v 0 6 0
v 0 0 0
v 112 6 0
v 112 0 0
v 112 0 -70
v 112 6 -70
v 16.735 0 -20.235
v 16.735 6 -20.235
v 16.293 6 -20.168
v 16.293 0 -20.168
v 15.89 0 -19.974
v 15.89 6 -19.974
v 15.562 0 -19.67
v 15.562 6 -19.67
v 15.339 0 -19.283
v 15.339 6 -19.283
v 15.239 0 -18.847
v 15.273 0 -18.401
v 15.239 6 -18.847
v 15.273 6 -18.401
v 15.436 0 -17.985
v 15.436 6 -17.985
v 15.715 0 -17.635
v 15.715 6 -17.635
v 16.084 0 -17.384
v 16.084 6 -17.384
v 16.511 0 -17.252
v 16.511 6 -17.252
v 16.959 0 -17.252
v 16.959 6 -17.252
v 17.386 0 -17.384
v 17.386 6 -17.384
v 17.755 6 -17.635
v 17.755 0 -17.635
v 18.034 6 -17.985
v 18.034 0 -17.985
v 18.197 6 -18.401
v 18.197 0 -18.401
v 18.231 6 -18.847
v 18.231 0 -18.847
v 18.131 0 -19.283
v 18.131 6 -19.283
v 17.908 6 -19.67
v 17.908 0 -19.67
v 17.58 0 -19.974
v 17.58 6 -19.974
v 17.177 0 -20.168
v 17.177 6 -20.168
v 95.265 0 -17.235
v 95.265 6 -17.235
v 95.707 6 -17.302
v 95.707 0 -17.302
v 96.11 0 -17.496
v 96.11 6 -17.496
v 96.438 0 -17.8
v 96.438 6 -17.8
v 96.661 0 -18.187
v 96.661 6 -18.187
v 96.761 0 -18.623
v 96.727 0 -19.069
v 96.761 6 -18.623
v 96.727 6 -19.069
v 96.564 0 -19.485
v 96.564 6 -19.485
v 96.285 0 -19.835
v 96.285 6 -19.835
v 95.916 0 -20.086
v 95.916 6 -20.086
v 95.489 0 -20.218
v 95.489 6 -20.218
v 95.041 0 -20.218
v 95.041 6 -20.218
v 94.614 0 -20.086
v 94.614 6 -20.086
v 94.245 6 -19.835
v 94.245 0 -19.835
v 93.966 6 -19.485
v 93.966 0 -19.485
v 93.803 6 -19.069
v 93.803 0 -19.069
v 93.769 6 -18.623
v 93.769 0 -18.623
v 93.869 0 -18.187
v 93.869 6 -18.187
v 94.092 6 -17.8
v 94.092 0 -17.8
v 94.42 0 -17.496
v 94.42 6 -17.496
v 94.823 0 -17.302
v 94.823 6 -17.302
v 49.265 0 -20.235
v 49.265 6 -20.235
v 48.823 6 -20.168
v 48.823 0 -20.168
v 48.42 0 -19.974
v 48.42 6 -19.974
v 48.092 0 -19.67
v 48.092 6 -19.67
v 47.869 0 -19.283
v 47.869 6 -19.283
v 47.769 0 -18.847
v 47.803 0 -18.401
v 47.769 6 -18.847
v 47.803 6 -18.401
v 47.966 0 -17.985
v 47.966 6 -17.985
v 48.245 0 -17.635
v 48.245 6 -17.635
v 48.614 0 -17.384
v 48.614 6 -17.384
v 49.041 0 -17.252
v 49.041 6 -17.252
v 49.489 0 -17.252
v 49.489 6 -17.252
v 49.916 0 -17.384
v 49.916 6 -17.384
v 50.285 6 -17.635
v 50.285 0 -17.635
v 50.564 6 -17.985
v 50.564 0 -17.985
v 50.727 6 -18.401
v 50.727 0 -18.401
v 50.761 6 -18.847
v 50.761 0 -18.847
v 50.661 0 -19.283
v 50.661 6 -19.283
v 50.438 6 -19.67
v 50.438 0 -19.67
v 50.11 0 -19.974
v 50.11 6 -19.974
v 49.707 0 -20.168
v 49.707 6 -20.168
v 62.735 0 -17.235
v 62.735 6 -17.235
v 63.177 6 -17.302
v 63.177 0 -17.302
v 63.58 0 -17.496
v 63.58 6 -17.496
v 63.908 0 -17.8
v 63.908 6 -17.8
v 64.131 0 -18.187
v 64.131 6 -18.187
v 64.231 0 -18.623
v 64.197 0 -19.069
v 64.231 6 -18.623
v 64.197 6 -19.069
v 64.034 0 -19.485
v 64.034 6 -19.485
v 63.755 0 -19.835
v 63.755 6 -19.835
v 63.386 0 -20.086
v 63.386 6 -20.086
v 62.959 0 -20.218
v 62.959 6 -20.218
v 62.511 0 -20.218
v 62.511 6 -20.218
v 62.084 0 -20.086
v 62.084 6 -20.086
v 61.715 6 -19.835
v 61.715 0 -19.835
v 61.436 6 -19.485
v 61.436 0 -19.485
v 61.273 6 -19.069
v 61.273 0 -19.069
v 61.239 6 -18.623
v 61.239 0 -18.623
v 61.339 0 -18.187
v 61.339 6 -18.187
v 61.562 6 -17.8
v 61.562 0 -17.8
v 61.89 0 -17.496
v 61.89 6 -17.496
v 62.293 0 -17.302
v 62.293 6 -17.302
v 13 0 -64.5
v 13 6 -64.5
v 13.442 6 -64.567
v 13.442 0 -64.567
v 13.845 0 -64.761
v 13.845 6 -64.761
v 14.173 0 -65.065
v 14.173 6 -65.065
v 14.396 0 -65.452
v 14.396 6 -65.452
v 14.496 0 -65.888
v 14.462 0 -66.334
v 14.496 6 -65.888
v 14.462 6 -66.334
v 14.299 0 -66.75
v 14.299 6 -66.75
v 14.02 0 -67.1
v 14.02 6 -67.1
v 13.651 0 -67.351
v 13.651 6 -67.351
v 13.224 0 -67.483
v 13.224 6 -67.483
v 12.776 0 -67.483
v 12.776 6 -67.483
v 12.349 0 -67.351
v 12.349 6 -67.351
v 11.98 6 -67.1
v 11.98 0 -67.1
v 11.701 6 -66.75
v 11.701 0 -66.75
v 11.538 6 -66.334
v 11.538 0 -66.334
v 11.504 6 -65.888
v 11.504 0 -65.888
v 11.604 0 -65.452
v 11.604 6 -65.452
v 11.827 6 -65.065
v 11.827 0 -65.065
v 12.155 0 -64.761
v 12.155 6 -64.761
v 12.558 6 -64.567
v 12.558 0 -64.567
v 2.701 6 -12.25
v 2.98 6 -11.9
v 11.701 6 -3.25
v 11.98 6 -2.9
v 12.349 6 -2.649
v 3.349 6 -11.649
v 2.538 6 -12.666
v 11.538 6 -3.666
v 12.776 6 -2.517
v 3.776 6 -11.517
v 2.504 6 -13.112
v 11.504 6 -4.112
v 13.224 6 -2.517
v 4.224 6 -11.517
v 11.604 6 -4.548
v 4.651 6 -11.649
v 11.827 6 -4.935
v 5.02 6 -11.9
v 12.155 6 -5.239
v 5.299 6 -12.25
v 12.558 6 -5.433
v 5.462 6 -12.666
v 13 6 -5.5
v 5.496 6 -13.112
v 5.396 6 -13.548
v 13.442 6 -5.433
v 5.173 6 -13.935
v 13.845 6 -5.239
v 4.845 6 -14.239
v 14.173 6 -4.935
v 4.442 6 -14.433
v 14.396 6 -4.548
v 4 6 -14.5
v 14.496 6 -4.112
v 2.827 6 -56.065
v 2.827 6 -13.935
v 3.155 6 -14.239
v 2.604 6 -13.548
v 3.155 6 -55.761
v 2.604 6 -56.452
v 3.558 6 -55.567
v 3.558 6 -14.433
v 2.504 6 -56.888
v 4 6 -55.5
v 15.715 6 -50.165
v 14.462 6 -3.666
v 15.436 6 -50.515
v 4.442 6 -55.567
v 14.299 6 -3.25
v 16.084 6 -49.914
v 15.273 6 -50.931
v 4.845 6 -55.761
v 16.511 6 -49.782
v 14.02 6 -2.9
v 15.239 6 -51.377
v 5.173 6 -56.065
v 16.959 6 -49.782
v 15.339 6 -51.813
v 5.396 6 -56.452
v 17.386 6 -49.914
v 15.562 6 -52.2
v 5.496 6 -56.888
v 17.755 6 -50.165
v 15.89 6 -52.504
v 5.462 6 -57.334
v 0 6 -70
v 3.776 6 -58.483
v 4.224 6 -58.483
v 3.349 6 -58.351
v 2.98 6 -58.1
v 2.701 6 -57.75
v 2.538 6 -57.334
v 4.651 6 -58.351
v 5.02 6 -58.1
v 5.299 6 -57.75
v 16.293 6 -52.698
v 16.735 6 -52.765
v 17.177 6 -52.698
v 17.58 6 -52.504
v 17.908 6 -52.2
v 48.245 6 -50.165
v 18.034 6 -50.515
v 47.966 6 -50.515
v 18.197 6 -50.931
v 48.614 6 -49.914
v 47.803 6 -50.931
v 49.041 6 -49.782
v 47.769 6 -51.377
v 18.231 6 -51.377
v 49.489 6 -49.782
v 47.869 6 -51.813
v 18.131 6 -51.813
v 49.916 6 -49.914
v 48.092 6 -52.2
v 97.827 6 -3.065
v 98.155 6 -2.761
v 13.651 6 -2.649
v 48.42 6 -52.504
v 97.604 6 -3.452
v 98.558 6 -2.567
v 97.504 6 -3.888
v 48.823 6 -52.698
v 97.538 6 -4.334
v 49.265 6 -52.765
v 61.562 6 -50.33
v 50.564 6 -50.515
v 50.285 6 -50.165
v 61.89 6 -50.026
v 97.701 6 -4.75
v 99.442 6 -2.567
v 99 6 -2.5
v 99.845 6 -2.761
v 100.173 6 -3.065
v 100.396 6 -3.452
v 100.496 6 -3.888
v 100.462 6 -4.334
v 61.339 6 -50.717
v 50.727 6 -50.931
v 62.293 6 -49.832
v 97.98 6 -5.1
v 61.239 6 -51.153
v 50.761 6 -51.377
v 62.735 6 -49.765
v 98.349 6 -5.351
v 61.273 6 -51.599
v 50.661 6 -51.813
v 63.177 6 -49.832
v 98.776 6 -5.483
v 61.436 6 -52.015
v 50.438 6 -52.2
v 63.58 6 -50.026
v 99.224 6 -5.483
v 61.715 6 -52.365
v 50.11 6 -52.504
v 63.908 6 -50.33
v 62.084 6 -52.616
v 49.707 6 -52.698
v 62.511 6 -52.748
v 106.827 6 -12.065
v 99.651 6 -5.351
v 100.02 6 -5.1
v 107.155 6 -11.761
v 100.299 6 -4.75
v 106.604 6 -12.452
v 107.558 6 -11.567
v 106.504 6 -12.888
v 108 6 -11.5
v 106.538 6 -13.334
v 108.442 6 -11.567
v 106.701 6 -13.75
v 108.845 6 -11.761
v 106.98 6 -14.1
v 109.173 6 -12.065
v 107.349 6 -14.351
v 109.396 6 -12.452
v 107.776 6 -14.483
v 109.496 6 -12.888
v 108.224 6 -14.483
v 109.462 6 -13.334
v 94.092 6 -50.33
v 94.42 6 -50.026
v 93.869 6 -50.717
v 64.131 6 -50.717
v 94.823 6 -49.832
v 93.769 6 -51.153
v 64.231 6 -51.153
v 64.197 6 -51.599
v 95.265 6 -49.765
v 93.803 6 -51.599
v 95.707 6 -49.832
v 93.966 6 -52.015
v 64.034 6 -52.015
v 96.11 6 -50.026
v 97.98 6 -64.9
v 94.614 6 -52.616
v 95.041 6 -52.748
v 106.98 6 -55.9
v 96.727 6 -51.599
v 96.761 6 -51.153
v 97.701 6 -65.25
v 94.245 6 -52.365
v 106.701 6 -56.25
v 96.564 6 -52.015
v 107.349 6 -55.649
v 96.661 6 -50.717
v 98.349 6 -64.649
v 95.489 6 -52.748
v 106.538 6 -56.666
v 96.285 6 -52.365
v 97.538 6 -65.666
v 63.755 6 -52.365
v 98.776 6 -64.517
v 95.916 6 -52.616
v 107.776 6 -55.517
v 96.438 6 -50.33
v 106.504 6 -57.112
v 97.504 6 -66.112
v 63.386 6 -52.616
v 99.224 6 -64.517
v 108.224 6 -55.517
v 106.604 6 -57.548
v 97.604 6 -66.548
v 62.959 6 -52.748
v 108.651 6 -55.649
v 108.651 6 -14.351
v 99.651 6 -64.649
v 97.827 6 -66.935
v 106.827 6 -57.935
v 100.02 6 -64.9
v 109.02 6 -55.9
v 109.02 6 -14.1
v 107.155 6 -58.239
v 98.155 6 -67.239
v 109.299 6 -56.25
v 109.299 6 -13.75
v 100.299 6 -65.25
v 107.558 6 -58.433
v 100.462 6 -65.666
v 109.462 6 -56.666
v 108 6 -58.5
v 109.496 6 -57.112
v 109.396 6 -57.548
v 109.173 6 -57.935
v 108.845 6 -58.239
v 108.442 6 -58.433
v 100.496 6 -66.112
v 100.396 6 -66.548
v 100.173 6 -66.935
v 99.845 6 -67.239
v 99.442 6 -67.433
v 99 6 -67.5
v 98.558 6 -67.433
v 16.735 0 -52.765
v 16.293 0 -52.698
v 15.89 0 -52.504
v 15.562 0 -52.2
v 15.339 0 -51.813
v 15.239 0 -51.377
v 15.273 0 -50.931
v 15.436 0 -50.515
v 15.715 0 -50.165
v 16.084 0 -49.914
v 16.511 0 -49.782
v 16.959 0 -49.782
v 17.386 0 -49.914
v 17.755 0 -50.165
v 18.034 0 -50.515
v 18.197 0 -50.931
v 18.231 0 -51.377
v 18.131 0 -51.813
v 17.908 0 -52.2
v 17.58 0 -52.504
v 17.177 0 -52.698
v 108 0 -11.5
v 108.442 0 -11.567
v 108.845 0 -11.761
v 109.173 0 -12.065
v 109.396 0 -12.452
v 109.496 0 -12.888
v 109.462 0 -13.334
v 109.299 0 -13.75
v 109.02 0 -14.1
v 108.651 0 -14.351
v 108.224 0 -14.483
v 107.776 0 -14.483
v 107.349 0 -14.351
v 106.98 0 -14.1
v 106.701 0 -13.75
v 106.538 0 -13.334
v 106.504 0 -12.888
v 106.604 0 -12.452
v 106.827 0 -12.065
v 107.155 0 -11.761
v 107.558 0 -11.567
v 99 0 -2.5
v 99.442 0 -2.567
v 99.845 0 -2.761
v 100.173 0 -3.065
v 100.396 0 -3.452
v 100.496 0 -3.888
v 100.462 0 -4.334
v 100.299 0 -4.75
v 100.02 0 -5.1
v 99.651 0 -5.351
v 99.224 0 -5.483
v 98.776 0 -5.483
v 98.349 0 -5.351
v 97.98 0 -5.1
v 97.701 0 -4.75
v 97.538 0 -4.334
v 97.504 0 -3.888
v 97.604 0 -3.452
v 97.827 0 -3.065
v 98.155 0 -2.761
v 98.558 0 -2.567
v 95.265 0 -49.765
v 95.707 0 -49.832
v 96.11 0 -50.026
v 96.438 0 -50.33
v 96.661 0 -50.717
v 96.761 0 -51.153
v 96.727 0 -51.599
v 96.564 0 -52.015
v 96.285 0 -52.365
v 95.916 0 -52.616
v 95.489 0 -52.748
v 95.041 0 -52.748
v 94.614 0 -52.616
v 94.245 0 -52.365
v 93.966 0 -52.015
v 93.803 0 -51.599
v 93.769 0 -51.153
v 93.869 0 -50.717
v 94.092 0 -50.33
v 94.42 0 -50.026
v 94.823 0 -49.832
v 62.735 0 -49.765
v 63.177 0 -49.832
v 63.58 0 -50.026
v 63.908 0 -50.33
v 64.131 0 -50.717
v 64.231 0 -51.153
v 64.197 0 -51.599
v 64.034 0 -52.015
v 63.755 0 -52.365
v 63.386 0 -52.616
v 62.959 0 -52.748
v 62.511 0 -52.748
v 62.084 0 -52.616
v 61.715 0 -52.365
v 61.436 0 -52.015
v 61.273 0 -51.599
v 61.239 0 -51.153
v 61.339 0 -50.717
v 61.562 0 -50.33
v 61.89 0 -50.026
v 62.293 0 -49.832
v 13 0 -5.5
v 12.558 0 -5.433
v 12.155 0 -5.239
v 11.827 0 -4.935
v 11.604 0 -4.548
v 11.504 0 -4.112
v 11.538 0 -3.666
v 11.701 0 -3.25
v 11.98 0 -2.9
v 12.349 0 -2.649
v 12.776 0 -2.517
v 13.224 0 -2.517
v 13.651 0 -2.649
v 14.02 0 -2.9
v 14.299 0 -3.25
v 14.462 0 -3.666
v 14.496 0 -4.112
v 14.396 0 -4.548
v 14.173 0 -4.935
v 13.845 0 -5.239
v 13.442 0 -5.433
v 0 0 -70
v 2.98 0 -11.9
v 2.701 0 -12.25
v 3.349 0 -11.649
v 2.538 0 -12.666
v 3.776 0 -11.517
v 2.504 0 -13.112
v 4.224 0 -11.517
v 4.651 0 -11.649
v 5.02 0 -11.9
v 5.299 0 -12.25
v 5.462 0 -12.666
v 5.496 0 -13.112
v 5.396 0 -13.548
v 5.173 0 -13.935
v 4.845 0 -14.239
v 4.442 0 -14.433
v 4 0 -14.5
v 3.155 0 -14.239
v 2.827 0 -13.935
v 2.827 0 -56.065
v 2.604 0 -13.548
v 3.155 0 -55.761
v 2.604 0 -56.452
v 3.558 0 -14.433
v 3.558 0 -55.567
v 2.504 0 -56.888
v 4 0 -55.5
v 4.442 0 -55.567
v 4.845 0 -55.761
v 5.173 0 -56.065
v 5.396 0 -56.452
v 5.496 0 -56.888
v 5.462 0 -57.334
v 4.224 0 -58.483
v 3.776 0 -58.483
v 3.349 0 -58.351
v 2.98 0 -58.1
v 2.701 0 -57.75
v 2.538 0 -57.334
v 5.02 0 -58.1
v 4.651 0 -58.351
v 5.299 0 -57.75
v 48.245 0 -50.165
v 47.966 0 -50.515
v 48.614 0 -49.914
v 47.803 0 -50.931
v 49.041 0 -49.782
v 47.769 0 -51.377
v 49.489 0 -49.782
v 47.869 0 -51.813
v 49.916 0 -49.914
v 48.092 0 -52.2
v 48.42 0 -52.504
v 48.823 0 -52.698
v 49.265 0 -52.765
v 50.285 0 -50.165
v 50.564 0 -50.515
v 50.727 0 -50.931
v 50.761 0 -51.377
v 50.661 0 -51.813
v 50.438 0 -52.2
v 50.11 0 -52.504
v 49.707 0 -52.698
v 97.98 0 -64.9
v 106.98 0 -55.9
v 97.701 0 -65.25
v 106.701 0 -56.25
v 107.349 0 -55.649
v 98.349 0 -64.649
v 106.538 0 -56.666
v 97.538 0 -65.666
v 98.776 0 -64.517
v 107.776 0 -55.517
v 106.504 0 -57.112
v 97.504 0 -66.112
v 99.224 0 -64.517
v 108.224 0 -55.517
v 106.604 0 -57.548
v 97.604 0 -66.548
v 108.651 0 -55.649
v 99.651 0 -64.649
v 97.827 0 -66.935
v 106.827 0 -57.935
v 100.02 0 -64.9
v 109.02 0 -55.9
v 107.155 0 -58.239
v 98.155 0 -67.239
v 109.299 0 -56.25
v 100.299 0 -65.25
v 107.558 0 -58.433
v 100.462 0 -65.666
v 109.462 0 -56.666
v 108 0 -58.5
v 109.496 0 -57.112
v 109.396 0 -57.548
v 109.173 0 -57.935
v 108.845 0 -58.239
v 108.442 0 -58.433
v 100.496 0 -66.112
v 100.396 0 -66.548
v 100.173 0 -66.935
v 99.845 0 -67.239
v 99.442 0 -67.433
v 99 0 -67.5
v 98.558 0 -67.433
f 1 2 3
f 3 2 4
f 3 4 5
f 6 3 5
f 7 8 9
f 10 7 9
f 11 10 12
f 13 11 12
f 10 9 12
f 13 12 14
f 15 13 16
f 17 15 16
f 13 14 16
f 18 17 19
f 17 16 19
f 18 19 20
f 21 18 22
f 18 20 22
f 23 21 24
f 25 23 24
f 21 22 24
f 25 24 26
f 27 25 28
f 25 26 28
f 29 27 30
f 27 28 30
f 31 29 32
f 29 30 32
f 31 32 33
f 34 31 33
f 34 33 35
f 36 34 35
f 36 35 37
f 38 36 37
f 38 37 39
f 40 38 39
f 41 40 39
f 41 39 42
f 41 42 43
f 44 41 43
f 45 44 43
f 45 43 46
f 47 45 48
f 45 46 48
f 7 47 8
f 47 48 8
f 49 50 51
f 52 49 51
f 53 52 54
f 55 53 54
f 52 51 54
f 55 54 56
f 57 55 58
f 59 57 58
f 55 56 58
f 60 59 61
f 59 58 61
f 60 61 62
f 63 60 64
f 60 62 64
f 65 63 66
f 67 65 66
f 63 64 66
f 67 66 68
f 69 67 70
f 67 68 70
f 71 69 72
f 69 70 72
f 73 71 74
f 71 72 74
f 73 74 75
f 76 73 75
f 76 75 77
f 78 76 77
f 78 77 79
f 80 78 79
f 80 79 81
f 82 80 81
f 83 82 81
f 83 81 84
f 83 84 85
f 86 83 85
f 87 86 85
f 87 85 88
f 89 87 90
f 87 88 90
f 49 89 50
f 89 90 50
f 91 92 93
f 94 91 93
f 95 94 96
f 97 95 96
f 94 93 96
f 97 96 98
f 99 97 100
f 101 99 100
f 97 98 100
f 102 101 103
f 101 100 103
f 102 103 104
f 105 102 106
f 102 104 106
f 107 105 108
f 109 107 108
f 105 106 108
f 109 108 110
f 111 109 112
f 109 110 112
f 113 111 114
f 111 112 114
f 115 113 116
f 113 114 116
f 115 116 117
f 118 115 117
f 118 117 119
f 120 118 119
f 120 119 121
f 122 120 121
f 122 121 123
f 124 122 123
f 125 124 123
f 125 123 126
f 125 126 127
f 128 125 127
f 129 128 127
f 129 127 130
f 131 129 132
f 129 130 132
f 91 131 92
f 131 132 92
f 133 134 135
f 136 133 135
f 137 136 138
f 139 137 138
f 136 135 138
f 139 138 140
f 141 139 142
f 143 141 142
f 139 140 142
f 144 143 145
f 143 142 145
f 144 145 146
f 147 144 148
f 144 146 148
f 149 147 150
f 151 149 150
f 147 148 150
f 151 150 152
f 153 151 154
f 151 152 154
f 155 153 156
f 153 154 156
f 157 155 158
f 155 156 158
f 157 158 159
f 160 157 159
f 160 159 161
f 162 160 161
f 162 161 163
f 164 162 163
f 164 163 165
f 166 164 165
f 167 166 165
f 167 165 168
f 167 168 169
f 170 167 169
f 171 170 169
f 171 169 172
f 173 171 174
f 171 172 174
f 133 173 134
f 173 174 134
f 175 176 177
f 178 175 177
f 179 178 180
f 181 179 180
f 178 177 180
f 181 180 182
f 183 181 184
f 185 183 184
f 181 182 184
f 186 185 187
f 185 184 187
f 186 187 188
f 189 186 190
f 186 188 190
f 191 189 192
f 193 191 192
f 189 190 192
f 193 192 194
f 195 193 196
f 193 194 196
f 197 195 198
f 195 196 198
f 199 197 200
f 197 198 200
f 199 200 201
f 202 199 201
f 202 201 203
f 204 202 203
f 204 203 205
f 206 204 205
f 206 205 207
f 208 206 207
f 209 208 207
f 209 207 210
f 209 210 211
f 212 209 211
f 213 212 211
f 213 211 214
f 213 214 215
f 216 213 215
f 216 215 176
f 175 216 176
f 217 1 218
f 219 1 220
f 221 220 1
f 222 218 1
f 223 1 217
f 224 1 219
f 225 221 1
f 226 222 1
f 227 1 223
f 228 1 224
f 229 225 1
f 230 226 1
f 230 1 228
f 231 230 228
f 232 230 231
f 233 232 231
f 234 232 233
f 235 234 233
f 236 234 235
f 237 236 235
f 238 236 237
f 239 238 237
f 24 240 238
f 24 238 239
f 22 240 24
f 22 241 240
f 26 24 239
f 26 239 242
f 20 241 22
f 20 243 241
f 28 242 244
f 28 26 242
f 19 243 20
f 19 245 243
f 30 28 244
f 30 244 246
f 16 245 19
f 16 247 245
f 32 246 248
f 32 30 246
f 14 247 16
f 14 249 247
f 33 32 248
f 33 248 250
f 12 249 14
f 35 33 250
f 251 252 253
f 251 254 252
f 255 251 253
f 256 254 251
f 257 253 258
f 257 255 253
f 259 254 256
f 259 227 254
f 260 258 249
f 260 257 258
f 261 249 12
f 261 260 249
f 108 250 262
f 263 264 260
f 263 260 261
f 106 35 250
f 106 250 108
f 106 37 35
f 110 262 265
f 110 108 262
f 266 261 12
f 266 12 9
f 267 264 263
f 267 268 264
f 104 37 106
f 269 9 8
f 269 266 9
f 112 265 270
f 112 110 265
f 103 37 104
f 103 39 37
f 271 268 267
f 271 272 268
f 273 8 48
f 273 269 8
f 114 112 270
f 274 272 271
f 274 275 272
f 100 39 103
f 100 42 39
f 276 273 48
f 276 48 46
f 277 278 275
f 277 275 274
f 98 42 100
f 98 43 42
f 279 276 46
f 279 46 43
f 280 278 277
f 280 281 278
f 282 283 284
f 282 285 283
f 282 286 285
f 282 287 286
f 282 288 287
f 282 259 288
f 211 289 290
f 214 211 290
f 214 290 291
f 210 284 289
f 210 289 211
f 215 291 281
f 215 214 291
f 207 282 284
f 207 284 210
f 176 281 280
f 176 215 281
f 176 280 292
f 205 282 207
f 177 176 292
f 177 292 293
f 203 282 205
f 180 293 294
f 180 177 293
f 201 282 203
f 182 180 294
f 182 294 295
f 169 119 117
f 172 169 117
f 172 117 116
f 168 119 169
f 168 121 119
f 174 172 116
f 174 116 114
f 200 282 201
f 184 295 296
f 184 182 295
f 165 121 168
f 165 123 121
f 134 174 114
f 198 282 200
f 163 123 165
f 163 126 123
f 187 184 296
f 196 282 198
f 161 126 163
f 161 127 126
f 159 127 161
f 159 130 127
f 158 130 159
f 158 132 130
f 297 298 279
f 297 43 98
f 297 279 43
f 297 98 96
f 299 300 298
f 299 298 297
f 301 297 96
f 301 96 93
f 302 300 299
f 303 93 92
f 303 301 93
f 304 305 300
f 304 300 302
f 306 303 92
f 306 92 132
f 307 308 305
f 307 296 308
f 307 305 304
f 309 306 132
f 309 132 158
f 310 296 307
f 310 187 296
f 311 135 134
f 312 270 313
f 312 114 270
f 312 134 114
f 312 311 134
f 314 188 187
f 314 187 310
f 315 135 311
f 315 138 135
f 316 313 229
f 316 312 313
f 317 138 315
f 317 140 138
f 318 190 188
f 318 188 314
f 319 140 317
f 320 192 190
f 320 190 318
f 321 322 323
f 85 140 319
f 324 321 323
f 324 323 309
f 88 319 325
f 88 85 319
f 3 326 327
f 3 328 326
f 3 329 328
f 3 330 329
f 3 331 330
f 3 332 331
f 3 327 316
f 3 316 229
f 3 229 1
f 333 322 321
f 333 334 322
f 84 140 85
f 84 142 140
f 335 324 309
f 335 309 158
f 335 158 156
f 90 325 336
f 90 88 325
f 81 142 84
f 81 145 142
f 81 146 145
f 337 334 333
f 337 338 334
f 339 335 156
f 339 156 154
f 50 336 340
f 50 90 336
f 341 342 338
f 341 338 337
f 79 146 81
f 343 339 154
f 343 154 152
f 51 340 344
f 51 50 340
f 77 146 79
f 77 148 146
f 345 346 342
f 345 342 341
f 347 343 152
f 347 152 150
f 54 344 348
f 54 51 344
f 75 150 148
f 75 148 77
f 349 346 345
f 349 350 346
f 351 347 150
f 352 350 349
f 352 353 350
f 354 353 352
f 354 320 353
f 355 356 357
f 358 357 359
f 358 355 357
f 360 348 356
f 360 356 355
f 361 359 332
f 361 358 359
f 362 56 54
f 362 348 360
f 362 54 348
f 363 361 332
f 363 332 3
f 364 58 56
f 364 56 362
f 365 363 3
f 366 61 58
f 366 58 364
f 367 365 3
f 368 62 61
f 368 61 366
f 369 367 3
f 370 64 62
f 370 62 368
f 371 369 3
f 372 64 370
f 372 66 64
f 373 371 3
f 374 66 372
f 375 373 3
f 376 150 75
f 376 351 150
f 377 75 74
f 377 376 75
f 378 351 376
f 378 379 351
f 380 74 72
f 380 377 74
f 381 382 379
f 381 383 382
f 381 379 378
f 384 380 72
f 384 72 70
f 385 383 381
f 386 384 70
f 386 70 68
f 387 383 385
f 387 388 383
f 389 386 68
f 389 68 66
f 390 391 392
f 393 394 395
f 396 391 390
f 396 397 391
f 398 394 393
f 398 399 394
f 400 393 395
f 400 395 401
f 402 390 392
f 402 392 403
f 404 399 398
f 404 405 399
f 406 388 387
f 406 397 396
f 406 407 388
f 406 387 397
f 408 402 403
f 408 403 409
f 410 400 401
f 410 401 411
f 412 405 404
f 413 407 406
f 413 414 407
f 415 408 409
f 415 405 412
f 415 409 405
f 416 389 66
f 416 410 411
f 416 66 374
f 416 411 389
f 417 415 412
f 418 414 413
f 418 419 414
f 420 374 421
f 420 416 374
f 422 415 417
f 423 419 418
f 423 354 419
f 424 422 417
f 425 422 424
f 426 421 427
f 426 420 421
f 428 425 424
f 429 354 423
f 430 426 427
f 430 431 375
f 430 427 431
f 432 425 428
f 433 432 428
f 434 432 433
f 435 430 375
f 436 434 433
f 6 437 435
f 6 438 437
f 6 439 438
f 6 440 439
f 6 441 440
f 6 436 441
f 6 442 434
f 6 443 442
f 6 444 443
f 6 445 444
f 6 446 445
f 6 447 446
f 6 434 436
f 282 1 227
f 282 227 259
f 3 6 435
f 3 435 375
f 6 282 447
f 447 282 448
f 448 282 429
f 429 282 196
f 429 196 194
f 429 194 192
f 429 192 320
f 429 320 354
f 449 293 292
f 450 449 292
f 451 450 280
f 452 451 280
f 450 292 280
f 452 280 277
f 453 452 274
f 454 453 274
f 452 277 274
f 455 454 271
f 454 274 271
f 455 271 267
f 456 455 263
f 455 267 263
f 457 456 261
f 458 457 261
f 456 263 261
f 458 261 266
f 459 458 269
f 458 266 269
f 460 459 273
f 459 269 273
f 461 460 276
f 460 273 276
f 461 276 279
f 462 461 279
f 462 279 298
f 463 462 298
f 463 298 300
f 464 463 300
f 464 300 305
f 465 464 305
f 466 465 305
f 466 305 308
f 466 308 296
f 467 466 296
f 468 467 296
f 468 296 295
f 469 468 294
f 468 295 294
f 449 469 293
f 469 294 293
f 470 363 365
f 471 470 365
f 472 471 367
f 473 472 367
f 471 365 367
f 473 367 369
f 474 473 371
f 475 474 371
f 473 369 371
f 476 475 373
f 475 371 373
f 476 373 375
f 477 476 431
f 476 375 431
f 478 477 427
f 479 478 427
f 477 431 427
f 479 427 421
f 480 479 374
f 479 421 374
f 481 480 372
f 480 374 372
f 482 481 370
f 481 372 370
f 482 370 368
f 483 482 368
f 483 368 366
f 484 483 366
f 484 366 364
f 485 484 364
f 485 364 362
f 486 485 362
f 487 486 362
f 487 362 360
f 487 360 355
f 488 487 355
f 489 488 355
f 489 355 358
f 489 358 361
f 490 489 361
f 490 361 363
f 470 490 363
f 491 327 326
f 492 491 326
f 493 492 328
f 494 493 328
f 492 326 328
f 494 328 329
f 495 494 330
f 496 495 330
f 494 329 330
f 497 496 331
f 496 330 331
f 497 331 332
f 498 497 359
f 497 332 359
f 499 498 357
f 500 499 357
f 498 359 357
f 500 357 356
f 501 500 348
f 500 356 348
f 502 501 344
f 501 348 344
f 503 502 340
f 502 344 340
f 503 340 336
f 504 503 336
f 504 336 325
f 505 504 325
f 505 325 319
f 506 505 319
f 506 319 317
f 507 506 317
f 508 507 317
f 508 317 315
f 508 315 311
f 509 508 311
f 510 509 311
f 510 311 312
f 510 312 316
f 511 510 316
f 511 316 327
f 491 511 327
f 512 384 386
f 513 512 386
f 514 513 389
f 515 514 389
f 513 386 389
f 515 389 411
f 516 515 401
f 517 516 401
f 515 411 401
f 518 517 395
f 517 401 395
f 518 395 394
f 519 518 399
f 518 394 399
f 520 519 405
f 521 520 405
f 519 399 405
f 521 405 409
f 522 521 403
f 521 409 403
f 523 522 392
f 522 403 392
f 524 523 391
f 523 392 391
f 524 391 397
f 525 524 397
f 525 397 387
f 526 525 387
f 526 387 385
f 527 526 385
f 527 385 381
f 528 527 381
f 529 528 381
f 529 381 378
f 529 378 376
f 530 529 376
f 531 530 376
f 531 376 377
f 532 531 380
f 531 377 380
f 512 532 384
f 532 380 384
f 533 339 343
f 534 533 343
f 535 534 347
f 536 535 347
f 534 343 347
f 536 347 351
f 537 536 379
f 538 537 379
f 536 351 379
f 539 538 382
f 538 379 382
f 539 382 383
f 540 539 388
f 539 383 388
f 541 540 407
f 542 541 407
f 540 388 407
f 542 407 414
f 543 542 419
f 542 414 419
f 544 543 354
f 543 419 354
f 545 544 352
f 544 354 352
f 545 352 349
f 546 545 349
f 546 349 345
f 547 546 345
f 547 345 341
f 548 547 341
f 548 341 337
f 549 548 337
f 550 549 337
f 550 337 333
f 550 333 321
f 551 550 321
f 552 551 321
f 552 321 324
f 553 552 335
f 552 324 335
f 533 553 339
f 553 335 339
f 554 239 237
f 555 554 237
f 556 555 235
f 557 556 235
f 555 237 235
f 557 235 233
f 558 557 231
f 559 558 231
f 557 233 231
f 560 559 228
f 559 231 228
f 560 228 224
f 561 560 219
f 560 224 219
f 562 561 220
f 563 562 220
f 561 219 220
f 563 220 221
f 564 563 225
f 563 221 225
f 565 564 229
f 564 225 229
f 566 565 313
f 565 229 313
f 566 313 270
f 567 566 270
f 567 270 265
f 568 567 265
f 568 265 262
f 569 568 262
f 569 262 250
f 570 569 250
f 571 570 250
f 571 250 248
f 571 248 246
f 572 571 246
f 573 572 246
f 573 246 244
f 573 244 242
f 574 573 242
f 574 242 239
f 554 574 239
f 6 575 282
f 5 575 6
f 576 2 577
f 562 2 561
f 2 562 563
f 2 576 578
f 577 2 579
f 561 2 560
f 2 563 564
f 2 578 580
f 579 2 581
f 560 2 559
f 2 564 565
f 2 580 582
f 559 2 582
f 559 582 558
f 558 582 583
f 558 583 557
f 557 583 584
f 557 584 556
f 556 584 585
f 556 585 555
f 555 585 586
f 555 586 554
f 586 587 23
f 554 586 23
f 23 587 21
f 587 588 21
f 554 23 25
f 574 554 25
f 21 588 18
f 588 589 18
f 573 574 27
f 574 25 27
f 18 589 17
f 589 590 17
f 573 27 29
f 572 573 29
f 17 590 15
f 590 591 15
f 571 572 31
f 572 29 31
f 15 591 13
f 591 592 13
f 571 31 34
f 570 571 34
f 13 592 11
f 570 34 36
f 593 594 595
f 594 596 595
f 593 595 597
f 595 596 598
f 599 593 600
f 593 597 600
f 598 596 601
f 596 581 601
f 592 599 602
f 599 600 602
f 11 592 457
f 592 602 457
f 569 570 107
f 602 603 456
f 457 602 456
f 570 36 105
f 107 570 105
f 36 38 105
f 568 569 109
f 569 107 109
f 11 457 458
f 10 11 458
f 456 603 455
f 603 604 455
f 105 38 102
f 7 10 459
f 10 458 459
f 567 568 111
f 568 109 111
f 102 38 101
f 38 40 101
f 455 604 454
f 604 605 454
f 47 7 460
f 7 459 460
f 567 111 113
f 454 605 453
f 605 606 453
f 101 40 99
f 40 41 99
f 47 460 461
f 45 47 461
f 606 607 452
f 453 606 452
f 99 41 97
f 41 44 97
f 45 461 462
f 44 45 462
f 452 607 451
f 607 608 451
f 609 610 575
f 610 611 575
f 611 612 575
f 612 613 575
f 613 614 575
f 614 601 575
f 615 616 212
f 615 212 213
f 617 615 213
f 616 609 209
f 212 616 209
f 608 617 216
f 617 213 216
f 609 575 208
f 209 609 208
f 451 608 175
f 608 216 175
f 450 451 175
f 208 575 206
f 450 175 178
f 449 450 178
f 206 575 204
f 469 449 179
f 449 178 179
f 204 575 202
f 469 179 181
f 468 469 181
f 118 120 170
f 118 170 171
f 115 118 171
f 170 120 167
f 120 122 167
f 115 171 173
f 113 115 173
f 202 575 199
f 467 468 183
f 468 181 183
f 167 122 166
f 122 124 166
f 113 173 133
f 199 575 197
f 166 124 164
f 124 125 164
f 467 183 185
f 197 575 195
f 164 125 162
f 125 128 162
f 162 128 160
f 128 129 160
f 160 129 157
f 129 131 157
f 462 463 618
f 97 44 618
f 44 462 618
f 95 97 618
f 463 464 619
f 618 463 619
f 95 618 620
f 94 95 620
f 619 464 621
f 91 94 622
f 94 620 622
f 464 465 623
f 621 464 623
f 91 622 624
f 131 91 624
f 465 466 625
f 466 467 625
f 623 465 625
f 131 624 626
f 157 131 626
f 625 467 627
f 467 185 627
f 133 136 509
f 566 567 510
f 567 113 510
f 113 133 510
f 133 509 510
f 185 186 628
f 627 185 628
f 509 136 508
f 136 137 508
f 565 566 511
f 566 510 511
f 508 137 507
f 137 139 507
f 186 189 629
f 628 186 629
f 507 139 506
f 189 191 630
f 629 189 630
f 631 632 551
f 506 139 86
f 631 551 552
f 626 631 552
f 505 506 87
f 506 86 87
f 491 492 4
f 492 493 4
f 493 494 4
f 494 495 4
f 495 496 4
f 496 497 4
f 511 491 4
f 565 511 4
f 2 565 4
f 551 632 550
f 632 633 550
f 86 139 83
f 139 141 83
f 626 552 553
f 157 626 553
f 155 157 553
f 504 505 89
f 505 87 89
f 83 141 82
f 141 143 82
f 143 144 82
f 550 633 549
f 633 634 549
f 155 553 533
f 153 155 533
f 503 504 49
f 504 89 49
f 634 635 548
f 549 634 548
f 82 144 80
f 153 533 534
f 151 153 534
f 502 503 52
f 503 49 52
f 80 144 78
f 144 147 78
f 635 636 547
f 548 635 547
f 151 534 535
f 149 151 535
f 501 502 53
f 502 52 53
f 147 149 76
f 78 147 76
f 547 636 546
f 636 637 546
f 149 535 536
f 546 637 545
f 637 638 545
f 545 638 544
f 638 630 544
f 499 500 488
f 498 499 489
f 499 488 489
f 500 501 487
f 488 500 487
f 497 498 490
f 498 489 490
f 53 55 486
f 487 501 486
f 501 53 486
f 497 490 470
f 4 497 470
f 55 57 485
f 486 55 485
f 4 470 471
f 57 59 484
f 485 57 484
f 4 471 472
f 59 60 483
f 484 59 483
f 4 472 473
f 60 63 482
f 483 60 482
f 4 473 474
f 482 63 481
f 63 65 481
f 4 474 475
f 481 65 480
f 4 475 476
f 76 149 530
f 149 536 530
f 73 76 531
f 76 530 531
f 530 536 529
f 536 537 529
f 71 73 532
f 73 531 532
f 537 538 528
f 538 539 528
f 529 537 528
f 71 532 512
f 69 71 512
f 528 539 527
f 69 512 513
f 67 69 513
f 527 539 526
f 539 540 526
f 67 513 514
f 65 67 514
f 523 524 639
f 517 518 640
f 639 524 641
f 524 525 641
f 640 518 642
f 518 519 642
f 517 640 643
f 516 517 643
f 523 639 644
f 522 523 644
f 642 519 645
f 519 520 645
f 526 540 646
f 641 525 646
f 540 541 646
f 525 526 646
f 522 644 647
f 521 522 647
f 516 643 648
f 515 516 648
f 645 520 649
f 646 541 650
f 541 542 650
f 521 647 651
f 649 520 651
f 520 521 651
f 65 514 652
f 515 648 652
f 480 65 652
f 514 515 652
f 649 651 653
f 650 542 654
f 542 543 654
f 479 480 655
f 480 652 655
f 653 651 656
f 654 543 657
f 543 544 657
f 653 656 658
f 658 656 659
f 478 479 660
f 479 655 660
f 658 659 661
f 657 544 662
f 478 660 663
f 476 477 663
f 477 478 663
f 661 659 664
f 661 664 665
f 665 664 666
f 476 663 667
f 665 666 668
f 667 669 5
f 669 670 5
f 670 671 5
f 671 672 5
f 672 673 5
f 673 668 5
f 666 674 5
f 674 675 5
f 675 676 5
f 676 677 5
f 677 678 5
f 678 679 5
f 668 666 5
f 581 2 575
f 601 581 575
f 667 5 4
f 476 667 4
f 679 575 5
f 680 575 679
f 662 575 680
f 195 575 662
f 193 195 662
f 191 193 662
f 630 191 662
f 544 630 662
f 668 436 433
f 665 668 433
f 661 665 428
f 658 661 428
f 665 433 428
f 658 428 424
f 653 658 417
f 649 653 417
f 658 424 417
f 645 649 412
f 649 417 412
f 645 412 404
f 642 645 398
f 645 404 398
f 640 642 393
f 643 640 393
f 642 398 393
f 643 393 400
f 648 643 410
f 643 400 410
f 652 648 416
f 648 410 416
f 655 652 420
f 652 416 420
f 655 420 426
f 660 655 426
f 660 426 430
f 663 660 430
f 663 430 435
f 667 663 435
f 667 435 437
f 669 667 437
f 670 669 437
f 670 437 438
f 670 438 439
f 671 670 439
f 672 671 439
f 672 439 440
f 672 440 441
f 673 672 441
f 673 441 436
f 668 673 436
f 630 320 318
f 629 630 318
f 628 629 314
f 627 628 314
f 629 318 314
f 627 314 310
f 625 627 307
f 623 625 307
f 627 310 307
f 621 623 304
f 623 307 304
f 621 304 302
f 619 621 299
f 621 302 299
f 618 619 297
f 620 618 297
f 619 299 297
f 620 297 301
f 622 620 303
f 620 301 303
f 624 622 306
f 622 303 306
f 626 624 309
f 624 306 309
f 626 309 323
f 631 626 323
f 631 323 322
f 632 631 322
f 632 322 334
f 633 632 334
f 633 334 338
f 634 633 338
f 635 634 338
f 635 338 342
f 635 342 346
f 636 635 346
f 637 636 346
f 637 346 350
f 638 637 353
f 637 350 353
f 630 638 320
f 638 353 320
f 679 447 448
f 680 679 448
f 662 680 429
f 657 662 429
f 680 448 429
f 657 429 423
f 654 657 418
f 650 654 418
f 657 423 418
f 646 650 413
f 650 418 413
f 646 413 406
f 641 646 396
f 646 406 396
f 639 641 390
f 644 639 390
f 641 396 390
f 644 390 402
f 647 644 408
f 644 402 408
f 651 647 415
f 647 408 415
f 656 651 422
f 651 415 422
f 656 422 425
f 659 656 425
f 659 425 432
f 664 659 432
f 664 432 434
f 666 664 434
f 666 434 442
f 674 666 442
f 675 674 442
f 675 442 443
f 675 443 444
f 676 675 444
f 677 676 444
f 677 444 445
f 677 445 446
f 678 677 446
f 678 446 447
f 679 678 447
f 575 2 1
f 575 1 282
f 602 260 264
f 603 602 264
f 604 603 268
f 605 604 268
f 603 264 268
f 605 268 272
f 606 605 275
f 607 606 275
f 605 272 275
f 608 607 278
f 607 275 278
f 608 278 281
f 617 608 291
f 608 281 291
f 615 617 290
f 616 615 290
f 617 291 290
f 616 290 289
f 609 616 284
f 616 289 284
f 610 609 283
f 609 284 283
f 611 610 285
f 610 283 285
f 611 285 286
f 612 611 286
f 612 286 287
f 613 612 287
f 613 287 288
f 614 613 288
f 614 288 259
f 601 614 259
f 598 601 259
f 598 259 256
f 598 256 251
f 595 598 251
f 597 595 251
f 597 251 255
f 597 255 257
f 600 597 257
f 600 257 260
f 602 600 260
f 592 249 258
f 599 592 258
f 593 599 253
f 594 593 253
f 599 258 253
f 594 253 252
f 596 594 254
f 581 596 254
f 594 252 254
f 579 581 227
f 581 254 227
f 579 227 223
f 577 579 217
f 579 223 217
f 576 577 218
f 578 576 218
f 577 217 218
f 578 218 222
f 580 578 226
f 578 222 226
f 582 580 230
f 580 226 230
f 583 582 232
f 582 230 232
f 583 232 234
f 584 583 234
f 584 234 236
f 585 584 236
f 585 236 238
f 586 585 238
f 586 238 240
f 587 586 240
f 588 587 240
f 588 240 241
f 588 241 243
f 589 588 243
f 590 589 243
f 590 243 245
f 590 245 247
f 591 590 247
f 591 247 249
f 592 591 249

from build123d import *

# Parameters (mm, degrees)
SKETCH1_W           = 112
SKETCH1_H           = 70
BOSS_EXTRUDE1_DEPTH = 6
SKETCH2_R           = 1.5
CUT_EXTRUDE1_DEPTH  = 6
SKETCH3_R           = 1.5
CUT_EXTRUDE2_DEPTH  = 10


with BuildPart() as part:
    # Sketch1 → Boss-Extrude1 (new body)
    with BuildSketch(Plane(origin=(0, 0, 0), x_dir=(1, 0, 0), z_dir=(0, 1, 0))):
        with Locations((56, 35)):
            Rectangle(SKETCH1_W, SKETCH1_H)
    extrude(amount=BOSS_EXTRUDE1_DEPTH)

    # Sketch2 → Cut-Extrude1 (cut)
    with BuildSketch(Plane(origin=(0, 6, 0), x_dir=(1, 0, 0), z_dir=(0, 1, 0))):
        with Locations(Location((62.735, 51.265, 0), (0, 0, 270))):
            Circle(SKETCH2_R)
        with Locations(Location((95.265, 51.265, 0), (0, 0, 270))):
            Circle(SKETCH2_R)
        with Locations(Location((62.735, 18.735, 0), (0, 0, 270))):
            Circle(SKETCH2_R)
        with Locations(Location((95.265, 18.735, 0), (0, 0, 270))):
            Circle(SKETCH2_R)
        with Locations(Location((16.735, 18.735, 0), (0, 0, 90))):
            Circle(SKETCH2_R)
        with Locations(Location((16.735, 51.265, 0), (0, 0, 90))):
            Circle(SKETCH2_R)
        with Locations(Location((49.265, 51.265, 0), (0, 0, 90))):
            Circle(SKETCH2_R)
        with Locations(Location((49.265, 18.735, 0), (0, 0, 90))):
            Circle(SKETCH2_R)
    extrude(amount=-CUT_EXTRUDE1_DEPTH, mode=Mode.SUBTRACT)

    # Sketch3 → Cut-Extrude2 (cut)
    with BuildSketch(Plane(origin=(0, 6, 0), x_dir=(1, 0, 0), z_dir=(0, 1, 0))):
        with Locations(Location((4, 57, 0), (0, 0, 270))):
            Circle(SKETCH3_R)
        with Locations(Location((13, 66, 0), (0, 0, 270))):
            Circle(SKETCH3_R)
        with Locations(Location((99, 66, 0), (0, 0, 90))):
            Circle(SKETCH3_R)
        with Locations(Location((108, 57, 0), (0, 0, 90))):
            Circle(SKETCH3_R)
        with Locations(Location((108, 13, 0), (0, 0, 270))):
            Circle(SKETCH3_R)
        with Locations(Location((99, 4, 0), (0, 0, 270))):
            Circle(SKETCH3_R)
        with Locations(Location((13, 4, 0), (0, 0, 90))):
            Circle(SKETCH3_R)
        with Locations(Location((4, 13, 0), (0, 0, 90))):
            Circle(SKETCH3_R)
    extrude(amount=-CUT_EXTRUDE2_DEPTH, mode=Mode.SUBTRACT)


solid = part.part
